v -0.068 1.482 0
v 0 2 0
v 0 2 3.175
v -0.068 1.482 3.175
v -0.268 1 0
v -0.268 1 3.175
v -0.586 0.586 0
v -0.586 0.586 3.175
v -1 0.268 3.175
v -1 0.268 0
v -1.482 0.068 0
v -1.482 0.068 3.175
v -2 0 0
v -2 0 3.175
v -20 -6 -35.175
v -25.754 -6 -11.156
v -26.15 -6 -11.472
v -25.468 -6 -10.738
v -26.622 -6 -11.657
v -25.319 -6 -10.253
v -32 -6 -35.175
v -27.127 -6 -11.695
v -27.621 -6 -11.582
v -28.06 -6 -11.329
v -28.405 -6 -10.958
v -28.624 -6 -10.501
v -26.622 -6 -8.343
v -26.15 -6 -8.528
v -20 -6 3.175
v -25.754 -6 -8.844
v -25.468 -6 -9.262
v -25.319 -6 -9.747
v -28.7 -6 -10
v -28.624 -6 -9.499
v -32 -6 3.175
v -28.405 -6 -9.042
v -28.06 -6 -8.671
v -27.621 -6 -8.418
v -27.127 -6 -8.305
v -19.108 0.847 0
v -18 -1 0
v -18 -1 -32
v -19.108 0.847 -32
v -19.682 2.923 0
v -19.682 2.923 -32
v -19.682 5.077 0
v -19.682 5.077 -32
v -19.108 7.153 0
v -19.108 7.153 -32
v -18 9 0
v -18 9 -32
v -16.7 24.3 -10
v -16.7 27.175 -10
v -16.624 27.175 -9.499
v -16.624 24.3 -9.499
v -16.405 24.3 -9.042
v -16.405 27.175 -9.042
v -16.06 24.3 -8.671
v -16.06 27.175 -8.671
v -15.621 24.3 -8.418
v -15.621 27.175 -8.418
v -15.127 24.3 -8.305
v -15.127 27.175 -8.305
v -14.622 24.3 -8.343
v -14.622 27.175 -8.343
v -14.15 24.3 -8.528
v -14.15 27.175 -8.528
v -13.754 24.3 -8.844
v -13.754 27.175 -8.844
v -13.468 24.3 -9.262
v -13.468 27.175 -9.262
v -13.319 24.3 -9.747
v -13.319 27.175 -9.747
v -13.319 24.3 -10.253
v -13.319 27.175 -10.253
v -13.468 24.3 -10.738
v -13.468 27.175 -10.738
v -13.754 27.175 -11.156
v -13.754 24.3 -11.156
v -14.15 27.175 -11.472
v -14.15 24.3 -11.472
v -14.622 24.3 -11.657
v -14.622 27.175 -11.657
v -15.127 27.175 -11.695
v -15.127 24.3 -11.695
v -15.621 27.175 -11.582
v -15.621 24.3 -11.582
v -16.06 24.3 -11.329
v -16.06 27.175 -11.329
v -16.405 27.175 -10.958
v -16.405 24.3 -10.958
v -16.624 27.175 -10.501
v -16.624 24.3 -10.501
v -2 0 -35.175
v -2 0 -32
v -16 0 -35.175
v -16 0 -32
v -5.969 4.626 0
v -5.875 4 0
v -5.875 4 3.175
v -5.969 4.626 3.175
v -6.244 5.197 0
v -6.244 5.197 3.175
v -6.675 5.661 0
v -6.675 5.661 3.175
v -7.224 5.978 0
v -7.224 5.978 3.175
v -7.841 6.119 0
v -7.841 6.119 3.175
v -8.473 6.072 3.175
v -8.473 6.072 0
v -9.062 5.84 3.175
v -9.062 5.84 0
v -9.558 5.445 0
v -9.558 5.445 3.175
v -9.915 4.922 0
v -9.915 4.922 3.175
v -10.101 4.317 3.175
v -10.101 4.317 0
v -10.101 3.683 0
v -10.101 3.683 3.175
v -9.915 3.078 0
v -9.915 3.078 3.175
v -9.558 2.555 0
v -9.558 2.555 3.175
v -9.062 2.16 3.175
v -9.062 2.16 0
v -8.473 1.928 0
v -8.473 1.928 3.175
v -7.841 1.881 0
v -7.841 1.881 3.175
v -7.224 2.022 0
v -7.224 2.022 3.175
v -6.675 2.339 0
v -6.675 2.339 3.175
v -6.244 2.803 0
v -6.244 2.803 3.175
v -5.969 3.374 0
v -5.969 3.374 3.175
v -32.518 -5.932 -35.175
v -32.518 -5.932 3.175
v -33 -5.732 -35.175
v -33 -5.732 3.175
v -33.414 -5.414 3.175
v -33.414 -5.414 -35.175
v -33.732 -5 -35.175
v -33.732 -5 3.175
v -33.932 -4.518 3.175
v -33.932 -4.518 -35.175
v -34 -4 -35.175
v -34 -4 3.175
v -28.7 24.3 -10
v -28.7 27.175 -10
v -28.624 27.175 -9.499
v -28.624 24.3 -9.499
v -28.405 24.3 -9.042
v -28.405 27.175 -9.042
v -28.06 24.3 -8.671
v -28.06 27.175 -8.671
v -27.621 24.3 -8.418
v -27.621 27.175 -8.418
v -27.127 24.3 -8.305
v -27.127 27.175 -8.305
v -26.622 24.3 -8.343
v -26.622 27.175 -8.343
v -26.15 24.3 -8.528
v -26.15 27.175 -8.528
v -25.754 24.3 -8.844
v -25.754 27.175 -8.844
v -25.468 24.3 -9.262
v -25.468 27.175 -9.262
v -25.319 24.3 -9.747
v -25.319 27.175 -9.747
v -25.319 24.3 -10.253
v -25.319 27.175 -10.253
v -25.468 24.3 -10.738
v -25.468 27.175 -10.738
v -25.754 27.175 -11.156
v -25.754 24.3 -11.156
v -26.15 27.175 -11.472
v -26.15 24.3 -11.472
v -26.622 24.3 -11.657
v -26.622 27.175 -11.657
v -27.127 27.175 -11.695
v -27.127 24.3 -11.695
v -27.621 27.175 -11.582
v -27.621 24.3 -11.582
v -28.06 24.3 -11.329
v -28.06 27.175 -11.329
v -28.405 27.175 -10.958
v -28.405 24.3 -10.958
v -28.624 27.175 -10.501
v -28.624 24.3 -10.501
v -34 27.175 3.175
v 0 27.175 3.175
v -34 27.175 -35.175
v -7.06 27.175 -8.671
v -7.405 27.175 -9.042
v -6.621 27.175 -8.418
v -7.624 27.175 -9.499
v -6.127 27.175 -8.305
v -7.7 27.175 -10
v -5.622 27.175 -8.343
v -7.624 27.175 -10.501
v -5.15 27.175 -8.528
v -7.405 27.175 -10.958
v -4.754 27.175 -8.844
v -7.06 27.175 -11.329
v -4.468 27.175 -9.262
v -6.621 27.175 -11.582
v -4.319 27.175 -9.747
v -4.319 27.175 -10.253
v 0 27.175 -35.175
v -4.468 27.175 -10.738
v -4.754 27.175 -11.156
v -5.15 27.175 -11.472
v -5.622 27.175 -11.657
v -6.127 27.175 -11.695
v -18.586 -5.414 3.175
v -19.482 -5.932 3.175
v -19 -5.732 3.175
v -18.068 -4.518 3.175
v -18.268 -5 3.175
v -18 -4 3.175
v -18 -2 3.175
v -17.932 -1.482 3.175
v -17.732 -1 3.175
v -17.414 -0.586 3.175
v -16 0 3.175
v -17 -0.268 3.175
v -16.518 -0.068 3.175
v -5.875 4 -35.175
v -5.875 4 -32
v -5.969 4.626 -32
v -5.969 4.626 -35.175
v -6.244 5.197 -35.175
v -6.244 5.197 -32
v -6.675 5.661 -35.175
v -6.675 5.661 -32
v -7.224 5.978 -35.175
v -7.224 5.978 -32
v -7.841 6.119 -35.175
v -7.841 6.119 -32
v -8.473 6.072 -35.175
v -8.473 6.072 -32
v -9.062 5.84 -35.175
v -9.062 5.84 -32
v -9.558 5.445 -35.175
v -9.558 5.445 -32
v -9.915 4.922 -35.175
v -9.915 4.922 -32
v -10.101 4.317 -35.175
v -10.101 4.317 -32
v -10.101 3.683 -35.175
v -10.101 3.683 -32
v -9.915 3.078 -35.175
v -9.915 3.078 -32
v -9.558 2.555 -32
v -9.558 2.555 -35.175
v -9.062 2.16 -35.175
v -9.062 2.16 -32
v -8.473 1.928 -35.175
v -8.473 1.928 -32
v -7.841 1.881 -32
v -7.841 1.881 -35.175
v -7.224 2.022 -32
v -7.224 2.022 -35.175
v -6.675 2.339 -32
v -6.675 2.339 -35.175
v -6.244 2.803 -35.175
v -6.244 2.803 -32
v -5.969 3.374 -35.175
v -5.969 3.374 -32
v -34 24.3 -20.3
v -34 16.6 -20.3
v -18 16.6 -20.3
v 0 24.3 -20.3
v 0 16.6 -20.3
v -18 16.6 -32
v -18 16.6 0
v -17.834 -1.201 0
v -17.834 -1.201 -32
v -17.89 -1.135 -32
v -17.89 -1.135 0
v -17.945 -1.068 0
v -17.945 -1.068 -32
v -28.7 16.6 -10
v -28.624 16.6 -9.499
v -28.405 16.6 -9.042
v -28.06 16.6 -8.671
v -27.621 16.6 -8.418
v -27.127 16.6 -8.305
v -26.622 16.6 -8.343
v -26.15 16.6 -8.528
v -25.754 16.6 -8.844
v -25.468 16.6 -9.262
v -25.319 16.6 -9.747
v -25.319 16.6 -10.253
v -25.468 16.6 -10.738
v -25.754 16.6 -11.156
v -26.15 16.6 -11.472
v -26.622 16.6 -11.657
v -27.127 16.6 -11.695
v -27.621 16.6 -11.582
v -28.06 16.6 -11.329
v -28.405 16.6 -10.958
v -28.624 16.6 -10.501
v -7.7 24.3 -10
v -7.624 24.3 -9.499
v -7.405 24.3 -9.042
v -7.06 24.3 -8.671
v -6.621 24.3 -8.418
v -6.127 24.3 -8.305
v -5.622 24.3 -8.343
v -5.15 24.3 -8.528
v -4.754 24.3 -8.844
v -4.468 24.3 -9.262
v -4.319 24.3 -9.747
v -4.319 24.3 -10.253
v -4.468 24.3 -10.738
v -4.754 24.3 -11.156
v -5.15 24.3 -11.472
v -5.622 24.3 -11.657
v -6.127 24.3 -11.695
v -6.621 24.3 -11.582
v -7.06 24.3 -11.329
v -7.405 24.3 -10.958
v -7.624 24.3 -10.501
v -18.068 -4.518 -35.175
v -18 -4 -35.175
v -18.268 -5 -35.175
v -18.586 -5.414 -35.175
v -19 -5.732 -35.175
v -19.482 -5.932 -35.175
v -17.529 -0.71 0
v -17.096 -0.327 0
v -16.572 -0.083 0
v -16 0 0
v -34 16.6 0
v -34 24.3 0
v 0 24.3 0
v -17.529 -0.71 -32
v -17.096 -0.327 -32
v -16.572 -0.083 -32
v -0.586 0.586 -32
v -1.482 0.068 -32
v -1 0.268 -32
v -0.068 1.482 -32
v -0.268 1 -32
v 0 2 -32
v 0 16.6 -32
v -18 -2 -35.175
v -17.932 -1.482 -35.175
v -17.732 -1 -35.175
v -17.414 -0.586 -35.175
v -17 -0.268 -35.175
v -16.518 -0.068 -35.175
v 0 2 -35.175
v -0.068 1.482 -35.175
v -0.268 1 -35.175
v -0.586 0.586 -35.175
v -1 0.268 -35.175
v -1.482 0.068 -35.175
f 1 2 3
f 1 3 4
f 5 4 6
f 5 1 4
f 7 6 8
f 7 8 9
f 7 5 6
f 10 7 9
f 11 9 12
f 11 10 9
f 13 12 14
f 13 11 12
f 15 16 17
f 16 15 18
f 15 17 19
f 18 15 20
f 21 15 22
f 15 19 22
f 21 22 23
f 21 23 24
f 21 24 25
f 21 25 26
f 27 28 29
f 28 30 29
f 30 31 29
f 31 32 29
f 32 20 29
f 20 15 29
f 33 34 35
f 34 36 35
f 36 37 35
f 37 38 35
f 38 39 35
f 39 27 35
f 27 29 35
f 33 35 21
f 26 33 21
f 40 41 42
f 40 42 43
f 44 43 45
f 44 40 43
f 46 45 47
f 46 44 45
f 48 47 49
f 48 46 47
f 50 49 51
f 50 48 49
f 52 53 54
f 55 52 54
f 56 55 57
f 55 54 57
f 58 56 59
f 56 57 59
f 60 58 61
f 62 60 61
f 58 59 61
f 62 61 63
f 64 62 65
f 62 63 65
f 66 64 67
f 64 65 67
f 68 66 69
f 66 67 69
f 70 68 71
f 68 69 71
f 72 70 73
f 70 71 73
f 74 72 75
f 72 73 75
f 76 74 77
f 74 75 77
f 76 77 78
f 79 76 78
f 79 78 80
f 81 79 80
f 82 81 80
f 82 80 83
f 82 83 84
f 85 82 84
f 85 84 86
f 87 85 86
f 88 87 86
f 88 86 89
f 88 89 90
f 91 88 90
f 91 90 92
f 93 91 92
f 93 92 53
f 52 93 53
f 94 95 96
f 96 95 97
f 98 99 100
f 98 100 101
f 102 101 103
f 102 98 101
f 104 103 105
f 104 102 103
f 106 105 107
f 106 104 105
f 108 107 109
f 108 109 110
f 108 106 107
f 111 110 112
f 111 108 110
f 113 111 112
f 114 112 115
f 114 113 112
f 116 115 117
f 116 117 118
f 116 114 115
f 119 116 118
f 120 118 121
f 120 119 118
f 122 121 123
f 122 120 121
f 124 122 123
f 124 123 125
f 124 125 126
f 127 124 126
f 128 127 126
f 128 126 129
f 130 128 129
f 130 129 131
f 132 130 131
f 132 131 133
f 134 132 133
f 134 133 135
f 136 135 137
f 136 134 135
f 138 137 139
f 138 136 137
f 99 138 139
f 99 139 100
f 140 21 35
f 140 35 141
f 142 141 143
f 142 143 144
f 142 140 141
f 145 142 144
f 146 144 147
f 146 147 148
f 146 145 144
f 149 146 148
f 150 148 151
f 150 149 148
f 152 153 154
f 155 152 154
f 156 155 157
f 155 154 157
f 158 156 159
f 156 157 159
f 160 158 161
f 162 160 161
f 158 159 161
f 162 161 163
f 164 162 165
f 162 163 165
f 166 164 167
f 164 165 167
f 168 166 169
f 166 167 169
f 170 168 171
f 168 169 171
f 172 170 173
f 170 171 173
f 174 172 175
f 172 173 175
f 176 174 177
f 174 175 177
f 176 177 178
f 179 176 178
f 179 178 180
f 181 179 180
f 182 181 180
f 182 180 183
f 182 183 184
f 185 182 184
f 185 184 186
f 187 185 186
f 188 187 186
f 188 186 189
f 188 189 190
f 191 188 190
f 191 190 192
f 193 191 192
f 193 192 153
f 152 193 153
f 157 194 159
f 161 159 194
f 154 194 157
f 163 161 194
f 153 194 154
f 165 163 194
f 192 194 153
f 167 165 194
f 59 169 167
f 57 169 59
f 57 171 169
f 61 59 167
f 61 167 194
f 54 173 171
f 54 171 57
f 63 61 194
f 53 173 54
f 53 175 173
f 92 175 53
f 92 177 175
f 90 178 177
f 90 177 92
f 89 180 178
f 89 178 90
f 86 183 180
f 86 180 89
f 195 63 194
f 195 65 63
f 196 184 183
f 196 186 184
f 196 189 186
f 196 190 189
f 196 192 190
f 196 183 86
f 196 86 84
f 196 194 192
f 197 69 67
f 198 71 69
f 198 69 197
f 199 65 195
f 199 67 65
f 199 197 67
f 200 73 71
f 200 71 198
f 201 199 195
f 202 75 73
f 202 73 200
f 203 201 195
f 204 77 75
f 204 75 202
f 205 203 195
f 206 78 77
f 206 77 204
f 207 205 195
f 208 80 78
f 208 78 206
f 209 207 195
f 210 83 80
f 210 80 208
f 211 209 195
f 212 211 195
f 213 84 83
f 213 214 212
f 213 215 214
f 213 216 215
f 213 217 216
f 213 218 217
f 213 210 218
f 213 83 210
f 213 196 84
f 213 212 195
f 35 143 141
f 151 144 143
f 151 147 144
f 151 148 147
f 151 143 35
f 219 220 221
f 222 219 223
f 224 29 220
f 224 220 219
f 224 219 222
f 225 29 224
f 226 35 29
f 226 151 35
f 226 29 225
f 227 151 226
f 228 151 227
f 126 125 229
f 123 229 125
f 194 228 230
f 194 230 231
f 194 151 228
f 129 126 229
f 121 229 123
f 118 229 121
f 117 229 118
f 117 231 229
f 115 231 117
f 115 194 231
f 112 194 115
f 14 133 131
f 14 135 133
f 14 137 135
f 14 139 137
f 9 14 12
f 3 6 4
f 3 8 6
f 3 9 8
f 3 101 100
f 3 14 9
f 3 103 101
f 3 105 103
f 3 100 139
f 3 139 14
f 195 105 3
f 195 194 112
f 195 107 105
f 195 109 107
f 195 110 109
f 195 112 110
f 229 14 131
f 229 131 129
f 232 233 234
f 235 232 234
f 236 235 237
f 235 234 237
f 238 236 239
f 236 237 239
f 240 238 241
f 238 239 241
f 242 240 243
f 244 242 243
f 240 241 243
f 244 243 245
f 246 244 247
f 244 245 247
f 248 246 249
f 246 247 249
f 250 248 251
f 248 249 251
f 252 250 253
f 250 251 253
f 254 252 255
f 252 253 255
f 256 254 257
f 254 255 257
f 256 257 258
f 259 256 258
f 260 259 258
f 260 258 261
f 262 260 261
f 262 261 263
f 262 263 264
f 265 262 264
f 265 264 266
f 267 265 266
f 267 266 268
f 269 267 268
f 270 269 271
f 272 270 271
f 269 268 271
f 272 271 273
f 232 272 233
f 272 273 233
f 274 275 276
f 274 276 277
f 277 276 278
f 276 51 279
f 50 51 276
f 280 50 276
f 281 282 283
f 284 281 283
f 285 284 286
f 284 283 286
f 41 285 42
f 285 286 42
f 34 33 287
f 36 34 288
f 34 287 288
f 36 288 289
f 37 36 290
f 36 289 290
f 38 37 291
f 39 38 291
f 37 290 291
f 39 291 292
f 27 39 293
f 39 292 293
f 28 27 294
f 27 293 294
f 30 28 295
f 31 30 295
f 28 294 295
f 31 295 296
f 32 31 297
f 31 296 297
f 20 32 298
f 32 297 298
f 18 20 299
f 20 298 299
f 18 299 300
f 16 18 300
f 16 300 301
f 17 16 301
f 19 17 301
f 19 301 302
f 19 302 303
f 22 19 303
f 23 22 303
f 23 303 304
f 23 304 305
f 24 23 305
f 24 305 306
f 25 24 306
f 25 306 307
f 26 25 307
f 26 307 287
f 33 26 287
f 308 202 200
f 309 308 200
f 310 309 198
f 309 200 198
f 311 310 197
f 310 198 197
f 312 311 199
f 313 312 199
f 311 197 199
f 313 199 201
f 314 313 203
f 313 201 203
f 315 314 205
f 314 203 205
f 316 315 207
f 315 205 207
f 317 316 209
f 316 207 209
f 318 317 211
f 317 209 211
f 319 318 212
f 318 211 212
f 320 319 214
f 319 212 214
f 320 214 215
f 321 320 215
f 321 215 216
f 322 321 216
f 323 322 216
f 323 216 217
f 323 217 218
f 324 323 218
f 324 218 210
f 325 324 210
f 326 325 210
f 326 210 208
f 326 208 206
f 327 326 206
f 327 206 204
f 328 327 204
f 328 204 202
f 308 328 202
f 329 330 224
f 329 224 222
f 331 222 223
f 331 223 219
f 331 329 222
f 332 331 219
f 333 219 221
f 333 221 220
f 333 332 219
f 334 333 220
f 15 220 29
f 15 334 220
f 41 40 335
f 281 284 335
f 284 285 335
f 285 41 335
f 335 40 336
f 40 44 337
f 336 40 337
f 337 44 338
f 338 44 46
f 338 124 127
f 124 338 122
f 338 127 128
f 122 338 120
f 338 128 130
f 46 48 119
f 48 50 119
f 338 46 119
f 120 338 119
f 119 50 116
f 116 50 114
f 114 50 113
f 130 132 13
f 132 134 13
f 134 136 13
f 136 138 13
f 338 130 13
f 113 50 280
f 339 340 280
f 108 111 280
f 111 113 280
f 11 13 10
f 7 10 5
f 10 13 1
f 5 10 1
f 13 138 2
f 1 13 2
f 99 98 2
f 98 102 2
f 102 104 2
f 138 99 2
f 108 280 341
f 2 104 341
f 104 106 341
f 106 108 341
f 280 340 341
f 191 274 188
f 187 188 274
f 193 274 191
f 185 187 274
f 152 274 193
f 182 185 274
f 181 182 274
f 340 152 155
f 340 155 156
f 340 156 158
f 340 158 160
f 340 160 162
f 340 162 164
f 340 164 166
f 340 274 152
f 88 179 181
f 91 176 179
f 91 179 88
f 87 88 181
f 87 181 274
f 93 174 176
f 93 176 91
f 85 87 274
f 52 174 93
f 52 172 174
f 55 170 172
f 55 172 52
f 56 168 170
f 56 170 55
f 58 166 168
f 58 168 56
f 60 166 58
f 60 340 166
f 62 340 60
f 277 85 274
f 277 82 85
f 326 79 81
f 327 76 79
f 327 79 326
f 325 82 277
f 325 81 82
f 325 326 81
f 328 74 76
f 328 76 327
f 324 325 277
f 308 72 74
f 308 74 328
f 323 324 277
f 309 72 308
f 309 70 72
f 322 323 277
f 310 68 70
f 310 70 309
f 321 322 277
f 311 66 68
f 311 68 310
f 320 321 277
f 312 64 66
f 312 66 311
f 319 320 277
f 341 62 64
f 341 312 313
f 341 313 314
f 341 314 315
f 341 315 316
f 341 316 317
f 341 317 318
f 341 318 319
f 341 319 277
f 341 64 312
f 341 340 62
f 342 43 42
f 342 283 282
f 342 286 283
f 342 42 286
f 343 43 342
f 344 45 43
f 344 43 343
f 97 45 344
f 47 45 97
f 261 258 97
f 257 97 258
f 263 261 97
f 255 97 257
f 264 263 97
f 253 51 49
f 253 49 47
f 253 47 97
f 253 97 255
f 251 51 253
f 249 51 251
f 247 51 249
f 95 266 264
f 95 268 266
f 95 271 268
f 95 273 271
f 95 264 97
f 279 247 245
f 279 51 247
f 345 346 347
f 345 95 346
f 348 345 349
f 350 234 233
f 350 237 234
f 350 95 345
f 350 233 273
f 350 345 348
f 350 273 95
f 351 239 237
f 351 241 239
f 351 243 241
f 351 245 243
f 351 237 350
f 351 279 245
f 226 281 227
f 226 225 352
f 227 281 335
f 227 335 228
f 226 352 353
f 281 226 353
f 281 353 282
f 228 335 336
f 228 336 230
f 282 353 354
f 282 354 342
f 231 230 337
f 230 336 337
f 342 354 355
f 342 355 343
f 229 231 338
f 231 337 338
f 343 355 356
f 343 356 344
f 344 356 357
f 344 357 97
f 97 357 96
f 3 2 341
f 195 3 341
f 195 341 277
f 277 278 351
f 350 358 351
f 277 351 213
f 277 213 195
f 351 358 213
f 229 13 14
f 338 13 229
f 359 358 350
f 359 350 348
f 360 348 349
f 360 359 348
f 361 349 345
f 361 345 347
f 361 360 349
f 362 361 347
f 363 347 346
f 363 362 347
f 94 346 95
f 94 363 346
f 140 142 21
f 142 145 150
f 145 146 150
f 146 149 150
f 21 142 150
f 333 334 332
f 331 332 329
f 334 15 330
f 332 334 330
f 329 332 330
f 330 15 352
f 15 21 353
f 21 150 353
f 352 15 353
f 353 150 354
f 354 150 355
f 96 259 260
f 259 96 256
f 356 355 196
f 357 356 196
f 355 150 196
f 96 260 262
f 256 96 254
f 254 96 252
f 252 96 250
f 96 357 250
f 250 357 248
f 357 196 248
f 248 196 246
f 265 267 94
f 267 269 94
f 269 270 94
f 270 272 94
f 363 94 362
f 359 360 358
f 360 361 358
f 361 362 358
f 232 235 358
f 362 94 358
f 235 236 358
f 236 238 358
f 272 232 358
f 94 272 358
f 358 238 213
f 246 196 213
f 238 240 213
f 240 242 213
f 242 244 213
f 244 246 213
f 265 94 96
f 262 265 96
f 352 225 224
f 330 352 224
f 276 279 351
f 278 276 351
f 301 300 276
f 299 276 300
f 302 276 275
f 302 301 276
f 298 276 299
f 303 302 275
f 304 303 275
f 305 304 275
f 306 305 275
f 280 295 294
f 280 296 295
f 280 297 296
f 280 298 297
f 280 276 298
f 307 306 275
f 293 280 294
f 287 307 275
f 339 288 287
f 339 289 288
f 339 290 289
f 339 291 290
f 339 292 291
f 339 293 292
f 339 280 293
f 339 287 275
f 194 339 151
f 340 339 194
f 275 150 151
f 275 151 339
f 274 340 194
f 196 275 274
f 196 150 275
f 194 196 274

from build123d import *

# Parameters (mm, degrees)
SKETCH1_R           = 2.125
BOSS_EXTRUDE1_DEPTH = 3.175
SKETCH4_W           = 34
SKETCH4_H           = 38.35
BOSS_EXTRUDE2_DEPTH = 3.175
BOSS_EXTRUDE3_REACH = 57.962
SKETCH6_W           = 34
SKETCH6_H           = 7.4
BOSS_EXTRUDE4_DEPTH = 11.7
FILLET1_START       = -36
FILLET1_DEPTH       = 40
FILLET1_START_2     = -35.175
FILLET1_2_DEPTH     = 3.175
FILLET1_3_DEPTH     = 3.175
FILLET1_START_3     = -32.3353435
FILLET1_4_DEPTH     = 32.635
SKETCH7_W           = 34
SKETCH7_H           = 20.3
CUT_EXTRUDE1_DEPTH  = 0.3
SKETCH8_R           = 1.7
CUT_EXTRUDE2_DEPTH  = 60.108893155


with BuildPart() as part:
    # Sketch1 → Boss-Extrude1 (new body)
    with BuildSketch(Plane.XY):
        Polygon((0, 0), (-18, 0), (-18, -6), (-34, -6), (-34, 0), (-34, 24), (0, 24), align=None)
        with Locations((-8, 4)):
            Circle(SKETCH1_R, mode=Mode.SUBTRACT)
    boss_extrude1 = extrude(amount=BOSS_EXTRUDE1_DEPTH)

    # Sketch4 → Boss-Extrude2 (add)
    with BuildSketch(Plane(origin=(0, 24, 0), x_dir=(1, 0, 0), z_dir=(0, 1, 0))):
        with Locations((-17, 16)):
            Rectangle(SKETCH4_W, SKETCH4_H)
    extrude(amount=BOSS_EXTRUDE2_DEPTH)

    # Mirror2: Boss-Extrude1 across plane
    add(boss_extrude1.mirror(Plane(origin=(0, 0, -16), x_dir=(1, 0, 0), z_dir=(0, 0, -1))))

    # Sketch5 → Boss-Extrude3 (add, up to next)
    with BuildSketch(Plane(origin=(0, 0, 0), x_dir=(-1, 0, 0), z_dir=(0, 0, -1)), mode=Mode.PRIVATE) as boss_extrude3_sk1:
        with BuildLine():
            Line((18, 9), (18, 16.6))
            Line((18, 16.6), (34, 16.6))
            Line((34, 16.6), (34, -6))
            Line((34, -6), (18, -6))
            Line((18, -6), (18, -1))
            ThreePointArc((18, -1), (19.755002002, 4), (18, 9))
        make_face()
    boss_extrude3_tool1 = extrude(boss_extrude3_sk1.sketch, amount=BOSS_EXTRUDE3_REACH, mode=Mode.PRIVATE) - part.part
    add(boss_extrude3_tool1.solids().sort_by_distance((-26.249904, 5.344559, 0))[0])

    # Sketch6 → Boss-Extrude4 (add)
    with BuildSketch(Plane.XY.offset(-32)):
        with Locations((-17, 20.3)):
            Rectangle(SKETCH6_W, SKETCH6_H)
    extrude(amount=BOSS_EXTRUDE4_DEPTH)

    # Fillet1: read off the stored shape, not the designer's step
    # Fillet1 outline → Fillet1 (cut)
    with BuildSketch(Plane.XY.offset(FILLET1_START)):
        with BuildLine():
            Line((-34, -6), (-32, -6))
            ThreePointArc((-32, -6), (-33.414213562, -5.414213562), (-34, -4))
            Line((-34, -4), (-34, -6))
        make_face()
        with BuildLine():
            Line((-18, -6), (-18, -4))
            ThreePointArc((-18, -4), (-18.585786438, -5.414213562), (-20, -6))
            Line((-20, -6), (-18, -6))
        make_face()
        with BuildLine():
            ThreePointArc((0, 2), (-0.585786438, 0.585786438), (-2, 0))
            Line((-2, 0), (0, 0))
            Line((0, 0), (0, 2))
        make_face()
    extrude(amount=FILLET1_DEPTH, mode=Mode.SUBTRACT)

    # Fillet1 2 outline → Fillet1 2 (add)
    with BuildSketch(Plane.XY.offset(FILLET1_START_2)):
        with BuildLine():
            Line((-16, 0), (-18, 0))
            Line((-18, 0), (-18, -2))
            ThreePointArc((-18, -2), (-17.414213562, -0.585786438), (-16, 0))
        make_face()
    extrude(amount=FILLET1_2_DEPTH)

    # Fillet1 3 outline → Fillet1 3 (add)
    with BuildSketch(Plane.XY):
        with BuildLine():
            Line((-16, 0), (-18, 0))
            Line((-18, 0), (-18, -2))
            ThreePointArc((-18, -2), (-17.414213562, -0.585786438), (-16, 0))
        make_face()
    extrude(amount=FILLET1_3_DEPTH)

    # Fillet1 4 outline → Fillet1 4 (add)
    with BuildSketch(Plane.XY.offset(FILLET1_START_3)):
        with BuildLine():
            ThreePointArc((-18, -2), (-17.957937252, -1.591978289), (-17.833518283, -1.201119092))
            ThreePointArc((-17.833518283, -1.201119092), (-17.91757965, -1.101238744), (-18, -1))
            Line((-18, -1), (-18, -2))
        make_face()
    extrude(amount=FILLET1_4_DEPTH)

    # Sketch7 → Cut-Extrude1 (cut)
    with BuildSketch(Plane.XZ.offset(-24)):
        with Locations((-17, -10.15)):
            Rectangle(SKETCH7_W, SKETCH7_H)
    extrude(amount=-CUT_EXTRUDE1_DEPTH, mode=Mode.SUBTRACT)

    # Sketch8 → Cut-Extrude2 (cut, through all)
    with BuildSketch(Plane(origin=(0, 27.175, 0), x_dir=(1, 0, 0), z_dir=(0, 1, 0))):
        with Locations(Location((-15, 10, 0), (0, 0, 180))):
            Circle(SKETCH8_R)
        with Locations(Location((-27, 10, 0), (0, 0, 180))):
            Circle(SKETCH8_R)
        with Locations(Location((-6, 10, 0), (0, 0, 180))):
            Circle(SKETCH8_R)
    extrude(amount=-CUT_EXTRUDE2_DEPTH, mode=Mode.SUBTRACT)


solid = part.part
